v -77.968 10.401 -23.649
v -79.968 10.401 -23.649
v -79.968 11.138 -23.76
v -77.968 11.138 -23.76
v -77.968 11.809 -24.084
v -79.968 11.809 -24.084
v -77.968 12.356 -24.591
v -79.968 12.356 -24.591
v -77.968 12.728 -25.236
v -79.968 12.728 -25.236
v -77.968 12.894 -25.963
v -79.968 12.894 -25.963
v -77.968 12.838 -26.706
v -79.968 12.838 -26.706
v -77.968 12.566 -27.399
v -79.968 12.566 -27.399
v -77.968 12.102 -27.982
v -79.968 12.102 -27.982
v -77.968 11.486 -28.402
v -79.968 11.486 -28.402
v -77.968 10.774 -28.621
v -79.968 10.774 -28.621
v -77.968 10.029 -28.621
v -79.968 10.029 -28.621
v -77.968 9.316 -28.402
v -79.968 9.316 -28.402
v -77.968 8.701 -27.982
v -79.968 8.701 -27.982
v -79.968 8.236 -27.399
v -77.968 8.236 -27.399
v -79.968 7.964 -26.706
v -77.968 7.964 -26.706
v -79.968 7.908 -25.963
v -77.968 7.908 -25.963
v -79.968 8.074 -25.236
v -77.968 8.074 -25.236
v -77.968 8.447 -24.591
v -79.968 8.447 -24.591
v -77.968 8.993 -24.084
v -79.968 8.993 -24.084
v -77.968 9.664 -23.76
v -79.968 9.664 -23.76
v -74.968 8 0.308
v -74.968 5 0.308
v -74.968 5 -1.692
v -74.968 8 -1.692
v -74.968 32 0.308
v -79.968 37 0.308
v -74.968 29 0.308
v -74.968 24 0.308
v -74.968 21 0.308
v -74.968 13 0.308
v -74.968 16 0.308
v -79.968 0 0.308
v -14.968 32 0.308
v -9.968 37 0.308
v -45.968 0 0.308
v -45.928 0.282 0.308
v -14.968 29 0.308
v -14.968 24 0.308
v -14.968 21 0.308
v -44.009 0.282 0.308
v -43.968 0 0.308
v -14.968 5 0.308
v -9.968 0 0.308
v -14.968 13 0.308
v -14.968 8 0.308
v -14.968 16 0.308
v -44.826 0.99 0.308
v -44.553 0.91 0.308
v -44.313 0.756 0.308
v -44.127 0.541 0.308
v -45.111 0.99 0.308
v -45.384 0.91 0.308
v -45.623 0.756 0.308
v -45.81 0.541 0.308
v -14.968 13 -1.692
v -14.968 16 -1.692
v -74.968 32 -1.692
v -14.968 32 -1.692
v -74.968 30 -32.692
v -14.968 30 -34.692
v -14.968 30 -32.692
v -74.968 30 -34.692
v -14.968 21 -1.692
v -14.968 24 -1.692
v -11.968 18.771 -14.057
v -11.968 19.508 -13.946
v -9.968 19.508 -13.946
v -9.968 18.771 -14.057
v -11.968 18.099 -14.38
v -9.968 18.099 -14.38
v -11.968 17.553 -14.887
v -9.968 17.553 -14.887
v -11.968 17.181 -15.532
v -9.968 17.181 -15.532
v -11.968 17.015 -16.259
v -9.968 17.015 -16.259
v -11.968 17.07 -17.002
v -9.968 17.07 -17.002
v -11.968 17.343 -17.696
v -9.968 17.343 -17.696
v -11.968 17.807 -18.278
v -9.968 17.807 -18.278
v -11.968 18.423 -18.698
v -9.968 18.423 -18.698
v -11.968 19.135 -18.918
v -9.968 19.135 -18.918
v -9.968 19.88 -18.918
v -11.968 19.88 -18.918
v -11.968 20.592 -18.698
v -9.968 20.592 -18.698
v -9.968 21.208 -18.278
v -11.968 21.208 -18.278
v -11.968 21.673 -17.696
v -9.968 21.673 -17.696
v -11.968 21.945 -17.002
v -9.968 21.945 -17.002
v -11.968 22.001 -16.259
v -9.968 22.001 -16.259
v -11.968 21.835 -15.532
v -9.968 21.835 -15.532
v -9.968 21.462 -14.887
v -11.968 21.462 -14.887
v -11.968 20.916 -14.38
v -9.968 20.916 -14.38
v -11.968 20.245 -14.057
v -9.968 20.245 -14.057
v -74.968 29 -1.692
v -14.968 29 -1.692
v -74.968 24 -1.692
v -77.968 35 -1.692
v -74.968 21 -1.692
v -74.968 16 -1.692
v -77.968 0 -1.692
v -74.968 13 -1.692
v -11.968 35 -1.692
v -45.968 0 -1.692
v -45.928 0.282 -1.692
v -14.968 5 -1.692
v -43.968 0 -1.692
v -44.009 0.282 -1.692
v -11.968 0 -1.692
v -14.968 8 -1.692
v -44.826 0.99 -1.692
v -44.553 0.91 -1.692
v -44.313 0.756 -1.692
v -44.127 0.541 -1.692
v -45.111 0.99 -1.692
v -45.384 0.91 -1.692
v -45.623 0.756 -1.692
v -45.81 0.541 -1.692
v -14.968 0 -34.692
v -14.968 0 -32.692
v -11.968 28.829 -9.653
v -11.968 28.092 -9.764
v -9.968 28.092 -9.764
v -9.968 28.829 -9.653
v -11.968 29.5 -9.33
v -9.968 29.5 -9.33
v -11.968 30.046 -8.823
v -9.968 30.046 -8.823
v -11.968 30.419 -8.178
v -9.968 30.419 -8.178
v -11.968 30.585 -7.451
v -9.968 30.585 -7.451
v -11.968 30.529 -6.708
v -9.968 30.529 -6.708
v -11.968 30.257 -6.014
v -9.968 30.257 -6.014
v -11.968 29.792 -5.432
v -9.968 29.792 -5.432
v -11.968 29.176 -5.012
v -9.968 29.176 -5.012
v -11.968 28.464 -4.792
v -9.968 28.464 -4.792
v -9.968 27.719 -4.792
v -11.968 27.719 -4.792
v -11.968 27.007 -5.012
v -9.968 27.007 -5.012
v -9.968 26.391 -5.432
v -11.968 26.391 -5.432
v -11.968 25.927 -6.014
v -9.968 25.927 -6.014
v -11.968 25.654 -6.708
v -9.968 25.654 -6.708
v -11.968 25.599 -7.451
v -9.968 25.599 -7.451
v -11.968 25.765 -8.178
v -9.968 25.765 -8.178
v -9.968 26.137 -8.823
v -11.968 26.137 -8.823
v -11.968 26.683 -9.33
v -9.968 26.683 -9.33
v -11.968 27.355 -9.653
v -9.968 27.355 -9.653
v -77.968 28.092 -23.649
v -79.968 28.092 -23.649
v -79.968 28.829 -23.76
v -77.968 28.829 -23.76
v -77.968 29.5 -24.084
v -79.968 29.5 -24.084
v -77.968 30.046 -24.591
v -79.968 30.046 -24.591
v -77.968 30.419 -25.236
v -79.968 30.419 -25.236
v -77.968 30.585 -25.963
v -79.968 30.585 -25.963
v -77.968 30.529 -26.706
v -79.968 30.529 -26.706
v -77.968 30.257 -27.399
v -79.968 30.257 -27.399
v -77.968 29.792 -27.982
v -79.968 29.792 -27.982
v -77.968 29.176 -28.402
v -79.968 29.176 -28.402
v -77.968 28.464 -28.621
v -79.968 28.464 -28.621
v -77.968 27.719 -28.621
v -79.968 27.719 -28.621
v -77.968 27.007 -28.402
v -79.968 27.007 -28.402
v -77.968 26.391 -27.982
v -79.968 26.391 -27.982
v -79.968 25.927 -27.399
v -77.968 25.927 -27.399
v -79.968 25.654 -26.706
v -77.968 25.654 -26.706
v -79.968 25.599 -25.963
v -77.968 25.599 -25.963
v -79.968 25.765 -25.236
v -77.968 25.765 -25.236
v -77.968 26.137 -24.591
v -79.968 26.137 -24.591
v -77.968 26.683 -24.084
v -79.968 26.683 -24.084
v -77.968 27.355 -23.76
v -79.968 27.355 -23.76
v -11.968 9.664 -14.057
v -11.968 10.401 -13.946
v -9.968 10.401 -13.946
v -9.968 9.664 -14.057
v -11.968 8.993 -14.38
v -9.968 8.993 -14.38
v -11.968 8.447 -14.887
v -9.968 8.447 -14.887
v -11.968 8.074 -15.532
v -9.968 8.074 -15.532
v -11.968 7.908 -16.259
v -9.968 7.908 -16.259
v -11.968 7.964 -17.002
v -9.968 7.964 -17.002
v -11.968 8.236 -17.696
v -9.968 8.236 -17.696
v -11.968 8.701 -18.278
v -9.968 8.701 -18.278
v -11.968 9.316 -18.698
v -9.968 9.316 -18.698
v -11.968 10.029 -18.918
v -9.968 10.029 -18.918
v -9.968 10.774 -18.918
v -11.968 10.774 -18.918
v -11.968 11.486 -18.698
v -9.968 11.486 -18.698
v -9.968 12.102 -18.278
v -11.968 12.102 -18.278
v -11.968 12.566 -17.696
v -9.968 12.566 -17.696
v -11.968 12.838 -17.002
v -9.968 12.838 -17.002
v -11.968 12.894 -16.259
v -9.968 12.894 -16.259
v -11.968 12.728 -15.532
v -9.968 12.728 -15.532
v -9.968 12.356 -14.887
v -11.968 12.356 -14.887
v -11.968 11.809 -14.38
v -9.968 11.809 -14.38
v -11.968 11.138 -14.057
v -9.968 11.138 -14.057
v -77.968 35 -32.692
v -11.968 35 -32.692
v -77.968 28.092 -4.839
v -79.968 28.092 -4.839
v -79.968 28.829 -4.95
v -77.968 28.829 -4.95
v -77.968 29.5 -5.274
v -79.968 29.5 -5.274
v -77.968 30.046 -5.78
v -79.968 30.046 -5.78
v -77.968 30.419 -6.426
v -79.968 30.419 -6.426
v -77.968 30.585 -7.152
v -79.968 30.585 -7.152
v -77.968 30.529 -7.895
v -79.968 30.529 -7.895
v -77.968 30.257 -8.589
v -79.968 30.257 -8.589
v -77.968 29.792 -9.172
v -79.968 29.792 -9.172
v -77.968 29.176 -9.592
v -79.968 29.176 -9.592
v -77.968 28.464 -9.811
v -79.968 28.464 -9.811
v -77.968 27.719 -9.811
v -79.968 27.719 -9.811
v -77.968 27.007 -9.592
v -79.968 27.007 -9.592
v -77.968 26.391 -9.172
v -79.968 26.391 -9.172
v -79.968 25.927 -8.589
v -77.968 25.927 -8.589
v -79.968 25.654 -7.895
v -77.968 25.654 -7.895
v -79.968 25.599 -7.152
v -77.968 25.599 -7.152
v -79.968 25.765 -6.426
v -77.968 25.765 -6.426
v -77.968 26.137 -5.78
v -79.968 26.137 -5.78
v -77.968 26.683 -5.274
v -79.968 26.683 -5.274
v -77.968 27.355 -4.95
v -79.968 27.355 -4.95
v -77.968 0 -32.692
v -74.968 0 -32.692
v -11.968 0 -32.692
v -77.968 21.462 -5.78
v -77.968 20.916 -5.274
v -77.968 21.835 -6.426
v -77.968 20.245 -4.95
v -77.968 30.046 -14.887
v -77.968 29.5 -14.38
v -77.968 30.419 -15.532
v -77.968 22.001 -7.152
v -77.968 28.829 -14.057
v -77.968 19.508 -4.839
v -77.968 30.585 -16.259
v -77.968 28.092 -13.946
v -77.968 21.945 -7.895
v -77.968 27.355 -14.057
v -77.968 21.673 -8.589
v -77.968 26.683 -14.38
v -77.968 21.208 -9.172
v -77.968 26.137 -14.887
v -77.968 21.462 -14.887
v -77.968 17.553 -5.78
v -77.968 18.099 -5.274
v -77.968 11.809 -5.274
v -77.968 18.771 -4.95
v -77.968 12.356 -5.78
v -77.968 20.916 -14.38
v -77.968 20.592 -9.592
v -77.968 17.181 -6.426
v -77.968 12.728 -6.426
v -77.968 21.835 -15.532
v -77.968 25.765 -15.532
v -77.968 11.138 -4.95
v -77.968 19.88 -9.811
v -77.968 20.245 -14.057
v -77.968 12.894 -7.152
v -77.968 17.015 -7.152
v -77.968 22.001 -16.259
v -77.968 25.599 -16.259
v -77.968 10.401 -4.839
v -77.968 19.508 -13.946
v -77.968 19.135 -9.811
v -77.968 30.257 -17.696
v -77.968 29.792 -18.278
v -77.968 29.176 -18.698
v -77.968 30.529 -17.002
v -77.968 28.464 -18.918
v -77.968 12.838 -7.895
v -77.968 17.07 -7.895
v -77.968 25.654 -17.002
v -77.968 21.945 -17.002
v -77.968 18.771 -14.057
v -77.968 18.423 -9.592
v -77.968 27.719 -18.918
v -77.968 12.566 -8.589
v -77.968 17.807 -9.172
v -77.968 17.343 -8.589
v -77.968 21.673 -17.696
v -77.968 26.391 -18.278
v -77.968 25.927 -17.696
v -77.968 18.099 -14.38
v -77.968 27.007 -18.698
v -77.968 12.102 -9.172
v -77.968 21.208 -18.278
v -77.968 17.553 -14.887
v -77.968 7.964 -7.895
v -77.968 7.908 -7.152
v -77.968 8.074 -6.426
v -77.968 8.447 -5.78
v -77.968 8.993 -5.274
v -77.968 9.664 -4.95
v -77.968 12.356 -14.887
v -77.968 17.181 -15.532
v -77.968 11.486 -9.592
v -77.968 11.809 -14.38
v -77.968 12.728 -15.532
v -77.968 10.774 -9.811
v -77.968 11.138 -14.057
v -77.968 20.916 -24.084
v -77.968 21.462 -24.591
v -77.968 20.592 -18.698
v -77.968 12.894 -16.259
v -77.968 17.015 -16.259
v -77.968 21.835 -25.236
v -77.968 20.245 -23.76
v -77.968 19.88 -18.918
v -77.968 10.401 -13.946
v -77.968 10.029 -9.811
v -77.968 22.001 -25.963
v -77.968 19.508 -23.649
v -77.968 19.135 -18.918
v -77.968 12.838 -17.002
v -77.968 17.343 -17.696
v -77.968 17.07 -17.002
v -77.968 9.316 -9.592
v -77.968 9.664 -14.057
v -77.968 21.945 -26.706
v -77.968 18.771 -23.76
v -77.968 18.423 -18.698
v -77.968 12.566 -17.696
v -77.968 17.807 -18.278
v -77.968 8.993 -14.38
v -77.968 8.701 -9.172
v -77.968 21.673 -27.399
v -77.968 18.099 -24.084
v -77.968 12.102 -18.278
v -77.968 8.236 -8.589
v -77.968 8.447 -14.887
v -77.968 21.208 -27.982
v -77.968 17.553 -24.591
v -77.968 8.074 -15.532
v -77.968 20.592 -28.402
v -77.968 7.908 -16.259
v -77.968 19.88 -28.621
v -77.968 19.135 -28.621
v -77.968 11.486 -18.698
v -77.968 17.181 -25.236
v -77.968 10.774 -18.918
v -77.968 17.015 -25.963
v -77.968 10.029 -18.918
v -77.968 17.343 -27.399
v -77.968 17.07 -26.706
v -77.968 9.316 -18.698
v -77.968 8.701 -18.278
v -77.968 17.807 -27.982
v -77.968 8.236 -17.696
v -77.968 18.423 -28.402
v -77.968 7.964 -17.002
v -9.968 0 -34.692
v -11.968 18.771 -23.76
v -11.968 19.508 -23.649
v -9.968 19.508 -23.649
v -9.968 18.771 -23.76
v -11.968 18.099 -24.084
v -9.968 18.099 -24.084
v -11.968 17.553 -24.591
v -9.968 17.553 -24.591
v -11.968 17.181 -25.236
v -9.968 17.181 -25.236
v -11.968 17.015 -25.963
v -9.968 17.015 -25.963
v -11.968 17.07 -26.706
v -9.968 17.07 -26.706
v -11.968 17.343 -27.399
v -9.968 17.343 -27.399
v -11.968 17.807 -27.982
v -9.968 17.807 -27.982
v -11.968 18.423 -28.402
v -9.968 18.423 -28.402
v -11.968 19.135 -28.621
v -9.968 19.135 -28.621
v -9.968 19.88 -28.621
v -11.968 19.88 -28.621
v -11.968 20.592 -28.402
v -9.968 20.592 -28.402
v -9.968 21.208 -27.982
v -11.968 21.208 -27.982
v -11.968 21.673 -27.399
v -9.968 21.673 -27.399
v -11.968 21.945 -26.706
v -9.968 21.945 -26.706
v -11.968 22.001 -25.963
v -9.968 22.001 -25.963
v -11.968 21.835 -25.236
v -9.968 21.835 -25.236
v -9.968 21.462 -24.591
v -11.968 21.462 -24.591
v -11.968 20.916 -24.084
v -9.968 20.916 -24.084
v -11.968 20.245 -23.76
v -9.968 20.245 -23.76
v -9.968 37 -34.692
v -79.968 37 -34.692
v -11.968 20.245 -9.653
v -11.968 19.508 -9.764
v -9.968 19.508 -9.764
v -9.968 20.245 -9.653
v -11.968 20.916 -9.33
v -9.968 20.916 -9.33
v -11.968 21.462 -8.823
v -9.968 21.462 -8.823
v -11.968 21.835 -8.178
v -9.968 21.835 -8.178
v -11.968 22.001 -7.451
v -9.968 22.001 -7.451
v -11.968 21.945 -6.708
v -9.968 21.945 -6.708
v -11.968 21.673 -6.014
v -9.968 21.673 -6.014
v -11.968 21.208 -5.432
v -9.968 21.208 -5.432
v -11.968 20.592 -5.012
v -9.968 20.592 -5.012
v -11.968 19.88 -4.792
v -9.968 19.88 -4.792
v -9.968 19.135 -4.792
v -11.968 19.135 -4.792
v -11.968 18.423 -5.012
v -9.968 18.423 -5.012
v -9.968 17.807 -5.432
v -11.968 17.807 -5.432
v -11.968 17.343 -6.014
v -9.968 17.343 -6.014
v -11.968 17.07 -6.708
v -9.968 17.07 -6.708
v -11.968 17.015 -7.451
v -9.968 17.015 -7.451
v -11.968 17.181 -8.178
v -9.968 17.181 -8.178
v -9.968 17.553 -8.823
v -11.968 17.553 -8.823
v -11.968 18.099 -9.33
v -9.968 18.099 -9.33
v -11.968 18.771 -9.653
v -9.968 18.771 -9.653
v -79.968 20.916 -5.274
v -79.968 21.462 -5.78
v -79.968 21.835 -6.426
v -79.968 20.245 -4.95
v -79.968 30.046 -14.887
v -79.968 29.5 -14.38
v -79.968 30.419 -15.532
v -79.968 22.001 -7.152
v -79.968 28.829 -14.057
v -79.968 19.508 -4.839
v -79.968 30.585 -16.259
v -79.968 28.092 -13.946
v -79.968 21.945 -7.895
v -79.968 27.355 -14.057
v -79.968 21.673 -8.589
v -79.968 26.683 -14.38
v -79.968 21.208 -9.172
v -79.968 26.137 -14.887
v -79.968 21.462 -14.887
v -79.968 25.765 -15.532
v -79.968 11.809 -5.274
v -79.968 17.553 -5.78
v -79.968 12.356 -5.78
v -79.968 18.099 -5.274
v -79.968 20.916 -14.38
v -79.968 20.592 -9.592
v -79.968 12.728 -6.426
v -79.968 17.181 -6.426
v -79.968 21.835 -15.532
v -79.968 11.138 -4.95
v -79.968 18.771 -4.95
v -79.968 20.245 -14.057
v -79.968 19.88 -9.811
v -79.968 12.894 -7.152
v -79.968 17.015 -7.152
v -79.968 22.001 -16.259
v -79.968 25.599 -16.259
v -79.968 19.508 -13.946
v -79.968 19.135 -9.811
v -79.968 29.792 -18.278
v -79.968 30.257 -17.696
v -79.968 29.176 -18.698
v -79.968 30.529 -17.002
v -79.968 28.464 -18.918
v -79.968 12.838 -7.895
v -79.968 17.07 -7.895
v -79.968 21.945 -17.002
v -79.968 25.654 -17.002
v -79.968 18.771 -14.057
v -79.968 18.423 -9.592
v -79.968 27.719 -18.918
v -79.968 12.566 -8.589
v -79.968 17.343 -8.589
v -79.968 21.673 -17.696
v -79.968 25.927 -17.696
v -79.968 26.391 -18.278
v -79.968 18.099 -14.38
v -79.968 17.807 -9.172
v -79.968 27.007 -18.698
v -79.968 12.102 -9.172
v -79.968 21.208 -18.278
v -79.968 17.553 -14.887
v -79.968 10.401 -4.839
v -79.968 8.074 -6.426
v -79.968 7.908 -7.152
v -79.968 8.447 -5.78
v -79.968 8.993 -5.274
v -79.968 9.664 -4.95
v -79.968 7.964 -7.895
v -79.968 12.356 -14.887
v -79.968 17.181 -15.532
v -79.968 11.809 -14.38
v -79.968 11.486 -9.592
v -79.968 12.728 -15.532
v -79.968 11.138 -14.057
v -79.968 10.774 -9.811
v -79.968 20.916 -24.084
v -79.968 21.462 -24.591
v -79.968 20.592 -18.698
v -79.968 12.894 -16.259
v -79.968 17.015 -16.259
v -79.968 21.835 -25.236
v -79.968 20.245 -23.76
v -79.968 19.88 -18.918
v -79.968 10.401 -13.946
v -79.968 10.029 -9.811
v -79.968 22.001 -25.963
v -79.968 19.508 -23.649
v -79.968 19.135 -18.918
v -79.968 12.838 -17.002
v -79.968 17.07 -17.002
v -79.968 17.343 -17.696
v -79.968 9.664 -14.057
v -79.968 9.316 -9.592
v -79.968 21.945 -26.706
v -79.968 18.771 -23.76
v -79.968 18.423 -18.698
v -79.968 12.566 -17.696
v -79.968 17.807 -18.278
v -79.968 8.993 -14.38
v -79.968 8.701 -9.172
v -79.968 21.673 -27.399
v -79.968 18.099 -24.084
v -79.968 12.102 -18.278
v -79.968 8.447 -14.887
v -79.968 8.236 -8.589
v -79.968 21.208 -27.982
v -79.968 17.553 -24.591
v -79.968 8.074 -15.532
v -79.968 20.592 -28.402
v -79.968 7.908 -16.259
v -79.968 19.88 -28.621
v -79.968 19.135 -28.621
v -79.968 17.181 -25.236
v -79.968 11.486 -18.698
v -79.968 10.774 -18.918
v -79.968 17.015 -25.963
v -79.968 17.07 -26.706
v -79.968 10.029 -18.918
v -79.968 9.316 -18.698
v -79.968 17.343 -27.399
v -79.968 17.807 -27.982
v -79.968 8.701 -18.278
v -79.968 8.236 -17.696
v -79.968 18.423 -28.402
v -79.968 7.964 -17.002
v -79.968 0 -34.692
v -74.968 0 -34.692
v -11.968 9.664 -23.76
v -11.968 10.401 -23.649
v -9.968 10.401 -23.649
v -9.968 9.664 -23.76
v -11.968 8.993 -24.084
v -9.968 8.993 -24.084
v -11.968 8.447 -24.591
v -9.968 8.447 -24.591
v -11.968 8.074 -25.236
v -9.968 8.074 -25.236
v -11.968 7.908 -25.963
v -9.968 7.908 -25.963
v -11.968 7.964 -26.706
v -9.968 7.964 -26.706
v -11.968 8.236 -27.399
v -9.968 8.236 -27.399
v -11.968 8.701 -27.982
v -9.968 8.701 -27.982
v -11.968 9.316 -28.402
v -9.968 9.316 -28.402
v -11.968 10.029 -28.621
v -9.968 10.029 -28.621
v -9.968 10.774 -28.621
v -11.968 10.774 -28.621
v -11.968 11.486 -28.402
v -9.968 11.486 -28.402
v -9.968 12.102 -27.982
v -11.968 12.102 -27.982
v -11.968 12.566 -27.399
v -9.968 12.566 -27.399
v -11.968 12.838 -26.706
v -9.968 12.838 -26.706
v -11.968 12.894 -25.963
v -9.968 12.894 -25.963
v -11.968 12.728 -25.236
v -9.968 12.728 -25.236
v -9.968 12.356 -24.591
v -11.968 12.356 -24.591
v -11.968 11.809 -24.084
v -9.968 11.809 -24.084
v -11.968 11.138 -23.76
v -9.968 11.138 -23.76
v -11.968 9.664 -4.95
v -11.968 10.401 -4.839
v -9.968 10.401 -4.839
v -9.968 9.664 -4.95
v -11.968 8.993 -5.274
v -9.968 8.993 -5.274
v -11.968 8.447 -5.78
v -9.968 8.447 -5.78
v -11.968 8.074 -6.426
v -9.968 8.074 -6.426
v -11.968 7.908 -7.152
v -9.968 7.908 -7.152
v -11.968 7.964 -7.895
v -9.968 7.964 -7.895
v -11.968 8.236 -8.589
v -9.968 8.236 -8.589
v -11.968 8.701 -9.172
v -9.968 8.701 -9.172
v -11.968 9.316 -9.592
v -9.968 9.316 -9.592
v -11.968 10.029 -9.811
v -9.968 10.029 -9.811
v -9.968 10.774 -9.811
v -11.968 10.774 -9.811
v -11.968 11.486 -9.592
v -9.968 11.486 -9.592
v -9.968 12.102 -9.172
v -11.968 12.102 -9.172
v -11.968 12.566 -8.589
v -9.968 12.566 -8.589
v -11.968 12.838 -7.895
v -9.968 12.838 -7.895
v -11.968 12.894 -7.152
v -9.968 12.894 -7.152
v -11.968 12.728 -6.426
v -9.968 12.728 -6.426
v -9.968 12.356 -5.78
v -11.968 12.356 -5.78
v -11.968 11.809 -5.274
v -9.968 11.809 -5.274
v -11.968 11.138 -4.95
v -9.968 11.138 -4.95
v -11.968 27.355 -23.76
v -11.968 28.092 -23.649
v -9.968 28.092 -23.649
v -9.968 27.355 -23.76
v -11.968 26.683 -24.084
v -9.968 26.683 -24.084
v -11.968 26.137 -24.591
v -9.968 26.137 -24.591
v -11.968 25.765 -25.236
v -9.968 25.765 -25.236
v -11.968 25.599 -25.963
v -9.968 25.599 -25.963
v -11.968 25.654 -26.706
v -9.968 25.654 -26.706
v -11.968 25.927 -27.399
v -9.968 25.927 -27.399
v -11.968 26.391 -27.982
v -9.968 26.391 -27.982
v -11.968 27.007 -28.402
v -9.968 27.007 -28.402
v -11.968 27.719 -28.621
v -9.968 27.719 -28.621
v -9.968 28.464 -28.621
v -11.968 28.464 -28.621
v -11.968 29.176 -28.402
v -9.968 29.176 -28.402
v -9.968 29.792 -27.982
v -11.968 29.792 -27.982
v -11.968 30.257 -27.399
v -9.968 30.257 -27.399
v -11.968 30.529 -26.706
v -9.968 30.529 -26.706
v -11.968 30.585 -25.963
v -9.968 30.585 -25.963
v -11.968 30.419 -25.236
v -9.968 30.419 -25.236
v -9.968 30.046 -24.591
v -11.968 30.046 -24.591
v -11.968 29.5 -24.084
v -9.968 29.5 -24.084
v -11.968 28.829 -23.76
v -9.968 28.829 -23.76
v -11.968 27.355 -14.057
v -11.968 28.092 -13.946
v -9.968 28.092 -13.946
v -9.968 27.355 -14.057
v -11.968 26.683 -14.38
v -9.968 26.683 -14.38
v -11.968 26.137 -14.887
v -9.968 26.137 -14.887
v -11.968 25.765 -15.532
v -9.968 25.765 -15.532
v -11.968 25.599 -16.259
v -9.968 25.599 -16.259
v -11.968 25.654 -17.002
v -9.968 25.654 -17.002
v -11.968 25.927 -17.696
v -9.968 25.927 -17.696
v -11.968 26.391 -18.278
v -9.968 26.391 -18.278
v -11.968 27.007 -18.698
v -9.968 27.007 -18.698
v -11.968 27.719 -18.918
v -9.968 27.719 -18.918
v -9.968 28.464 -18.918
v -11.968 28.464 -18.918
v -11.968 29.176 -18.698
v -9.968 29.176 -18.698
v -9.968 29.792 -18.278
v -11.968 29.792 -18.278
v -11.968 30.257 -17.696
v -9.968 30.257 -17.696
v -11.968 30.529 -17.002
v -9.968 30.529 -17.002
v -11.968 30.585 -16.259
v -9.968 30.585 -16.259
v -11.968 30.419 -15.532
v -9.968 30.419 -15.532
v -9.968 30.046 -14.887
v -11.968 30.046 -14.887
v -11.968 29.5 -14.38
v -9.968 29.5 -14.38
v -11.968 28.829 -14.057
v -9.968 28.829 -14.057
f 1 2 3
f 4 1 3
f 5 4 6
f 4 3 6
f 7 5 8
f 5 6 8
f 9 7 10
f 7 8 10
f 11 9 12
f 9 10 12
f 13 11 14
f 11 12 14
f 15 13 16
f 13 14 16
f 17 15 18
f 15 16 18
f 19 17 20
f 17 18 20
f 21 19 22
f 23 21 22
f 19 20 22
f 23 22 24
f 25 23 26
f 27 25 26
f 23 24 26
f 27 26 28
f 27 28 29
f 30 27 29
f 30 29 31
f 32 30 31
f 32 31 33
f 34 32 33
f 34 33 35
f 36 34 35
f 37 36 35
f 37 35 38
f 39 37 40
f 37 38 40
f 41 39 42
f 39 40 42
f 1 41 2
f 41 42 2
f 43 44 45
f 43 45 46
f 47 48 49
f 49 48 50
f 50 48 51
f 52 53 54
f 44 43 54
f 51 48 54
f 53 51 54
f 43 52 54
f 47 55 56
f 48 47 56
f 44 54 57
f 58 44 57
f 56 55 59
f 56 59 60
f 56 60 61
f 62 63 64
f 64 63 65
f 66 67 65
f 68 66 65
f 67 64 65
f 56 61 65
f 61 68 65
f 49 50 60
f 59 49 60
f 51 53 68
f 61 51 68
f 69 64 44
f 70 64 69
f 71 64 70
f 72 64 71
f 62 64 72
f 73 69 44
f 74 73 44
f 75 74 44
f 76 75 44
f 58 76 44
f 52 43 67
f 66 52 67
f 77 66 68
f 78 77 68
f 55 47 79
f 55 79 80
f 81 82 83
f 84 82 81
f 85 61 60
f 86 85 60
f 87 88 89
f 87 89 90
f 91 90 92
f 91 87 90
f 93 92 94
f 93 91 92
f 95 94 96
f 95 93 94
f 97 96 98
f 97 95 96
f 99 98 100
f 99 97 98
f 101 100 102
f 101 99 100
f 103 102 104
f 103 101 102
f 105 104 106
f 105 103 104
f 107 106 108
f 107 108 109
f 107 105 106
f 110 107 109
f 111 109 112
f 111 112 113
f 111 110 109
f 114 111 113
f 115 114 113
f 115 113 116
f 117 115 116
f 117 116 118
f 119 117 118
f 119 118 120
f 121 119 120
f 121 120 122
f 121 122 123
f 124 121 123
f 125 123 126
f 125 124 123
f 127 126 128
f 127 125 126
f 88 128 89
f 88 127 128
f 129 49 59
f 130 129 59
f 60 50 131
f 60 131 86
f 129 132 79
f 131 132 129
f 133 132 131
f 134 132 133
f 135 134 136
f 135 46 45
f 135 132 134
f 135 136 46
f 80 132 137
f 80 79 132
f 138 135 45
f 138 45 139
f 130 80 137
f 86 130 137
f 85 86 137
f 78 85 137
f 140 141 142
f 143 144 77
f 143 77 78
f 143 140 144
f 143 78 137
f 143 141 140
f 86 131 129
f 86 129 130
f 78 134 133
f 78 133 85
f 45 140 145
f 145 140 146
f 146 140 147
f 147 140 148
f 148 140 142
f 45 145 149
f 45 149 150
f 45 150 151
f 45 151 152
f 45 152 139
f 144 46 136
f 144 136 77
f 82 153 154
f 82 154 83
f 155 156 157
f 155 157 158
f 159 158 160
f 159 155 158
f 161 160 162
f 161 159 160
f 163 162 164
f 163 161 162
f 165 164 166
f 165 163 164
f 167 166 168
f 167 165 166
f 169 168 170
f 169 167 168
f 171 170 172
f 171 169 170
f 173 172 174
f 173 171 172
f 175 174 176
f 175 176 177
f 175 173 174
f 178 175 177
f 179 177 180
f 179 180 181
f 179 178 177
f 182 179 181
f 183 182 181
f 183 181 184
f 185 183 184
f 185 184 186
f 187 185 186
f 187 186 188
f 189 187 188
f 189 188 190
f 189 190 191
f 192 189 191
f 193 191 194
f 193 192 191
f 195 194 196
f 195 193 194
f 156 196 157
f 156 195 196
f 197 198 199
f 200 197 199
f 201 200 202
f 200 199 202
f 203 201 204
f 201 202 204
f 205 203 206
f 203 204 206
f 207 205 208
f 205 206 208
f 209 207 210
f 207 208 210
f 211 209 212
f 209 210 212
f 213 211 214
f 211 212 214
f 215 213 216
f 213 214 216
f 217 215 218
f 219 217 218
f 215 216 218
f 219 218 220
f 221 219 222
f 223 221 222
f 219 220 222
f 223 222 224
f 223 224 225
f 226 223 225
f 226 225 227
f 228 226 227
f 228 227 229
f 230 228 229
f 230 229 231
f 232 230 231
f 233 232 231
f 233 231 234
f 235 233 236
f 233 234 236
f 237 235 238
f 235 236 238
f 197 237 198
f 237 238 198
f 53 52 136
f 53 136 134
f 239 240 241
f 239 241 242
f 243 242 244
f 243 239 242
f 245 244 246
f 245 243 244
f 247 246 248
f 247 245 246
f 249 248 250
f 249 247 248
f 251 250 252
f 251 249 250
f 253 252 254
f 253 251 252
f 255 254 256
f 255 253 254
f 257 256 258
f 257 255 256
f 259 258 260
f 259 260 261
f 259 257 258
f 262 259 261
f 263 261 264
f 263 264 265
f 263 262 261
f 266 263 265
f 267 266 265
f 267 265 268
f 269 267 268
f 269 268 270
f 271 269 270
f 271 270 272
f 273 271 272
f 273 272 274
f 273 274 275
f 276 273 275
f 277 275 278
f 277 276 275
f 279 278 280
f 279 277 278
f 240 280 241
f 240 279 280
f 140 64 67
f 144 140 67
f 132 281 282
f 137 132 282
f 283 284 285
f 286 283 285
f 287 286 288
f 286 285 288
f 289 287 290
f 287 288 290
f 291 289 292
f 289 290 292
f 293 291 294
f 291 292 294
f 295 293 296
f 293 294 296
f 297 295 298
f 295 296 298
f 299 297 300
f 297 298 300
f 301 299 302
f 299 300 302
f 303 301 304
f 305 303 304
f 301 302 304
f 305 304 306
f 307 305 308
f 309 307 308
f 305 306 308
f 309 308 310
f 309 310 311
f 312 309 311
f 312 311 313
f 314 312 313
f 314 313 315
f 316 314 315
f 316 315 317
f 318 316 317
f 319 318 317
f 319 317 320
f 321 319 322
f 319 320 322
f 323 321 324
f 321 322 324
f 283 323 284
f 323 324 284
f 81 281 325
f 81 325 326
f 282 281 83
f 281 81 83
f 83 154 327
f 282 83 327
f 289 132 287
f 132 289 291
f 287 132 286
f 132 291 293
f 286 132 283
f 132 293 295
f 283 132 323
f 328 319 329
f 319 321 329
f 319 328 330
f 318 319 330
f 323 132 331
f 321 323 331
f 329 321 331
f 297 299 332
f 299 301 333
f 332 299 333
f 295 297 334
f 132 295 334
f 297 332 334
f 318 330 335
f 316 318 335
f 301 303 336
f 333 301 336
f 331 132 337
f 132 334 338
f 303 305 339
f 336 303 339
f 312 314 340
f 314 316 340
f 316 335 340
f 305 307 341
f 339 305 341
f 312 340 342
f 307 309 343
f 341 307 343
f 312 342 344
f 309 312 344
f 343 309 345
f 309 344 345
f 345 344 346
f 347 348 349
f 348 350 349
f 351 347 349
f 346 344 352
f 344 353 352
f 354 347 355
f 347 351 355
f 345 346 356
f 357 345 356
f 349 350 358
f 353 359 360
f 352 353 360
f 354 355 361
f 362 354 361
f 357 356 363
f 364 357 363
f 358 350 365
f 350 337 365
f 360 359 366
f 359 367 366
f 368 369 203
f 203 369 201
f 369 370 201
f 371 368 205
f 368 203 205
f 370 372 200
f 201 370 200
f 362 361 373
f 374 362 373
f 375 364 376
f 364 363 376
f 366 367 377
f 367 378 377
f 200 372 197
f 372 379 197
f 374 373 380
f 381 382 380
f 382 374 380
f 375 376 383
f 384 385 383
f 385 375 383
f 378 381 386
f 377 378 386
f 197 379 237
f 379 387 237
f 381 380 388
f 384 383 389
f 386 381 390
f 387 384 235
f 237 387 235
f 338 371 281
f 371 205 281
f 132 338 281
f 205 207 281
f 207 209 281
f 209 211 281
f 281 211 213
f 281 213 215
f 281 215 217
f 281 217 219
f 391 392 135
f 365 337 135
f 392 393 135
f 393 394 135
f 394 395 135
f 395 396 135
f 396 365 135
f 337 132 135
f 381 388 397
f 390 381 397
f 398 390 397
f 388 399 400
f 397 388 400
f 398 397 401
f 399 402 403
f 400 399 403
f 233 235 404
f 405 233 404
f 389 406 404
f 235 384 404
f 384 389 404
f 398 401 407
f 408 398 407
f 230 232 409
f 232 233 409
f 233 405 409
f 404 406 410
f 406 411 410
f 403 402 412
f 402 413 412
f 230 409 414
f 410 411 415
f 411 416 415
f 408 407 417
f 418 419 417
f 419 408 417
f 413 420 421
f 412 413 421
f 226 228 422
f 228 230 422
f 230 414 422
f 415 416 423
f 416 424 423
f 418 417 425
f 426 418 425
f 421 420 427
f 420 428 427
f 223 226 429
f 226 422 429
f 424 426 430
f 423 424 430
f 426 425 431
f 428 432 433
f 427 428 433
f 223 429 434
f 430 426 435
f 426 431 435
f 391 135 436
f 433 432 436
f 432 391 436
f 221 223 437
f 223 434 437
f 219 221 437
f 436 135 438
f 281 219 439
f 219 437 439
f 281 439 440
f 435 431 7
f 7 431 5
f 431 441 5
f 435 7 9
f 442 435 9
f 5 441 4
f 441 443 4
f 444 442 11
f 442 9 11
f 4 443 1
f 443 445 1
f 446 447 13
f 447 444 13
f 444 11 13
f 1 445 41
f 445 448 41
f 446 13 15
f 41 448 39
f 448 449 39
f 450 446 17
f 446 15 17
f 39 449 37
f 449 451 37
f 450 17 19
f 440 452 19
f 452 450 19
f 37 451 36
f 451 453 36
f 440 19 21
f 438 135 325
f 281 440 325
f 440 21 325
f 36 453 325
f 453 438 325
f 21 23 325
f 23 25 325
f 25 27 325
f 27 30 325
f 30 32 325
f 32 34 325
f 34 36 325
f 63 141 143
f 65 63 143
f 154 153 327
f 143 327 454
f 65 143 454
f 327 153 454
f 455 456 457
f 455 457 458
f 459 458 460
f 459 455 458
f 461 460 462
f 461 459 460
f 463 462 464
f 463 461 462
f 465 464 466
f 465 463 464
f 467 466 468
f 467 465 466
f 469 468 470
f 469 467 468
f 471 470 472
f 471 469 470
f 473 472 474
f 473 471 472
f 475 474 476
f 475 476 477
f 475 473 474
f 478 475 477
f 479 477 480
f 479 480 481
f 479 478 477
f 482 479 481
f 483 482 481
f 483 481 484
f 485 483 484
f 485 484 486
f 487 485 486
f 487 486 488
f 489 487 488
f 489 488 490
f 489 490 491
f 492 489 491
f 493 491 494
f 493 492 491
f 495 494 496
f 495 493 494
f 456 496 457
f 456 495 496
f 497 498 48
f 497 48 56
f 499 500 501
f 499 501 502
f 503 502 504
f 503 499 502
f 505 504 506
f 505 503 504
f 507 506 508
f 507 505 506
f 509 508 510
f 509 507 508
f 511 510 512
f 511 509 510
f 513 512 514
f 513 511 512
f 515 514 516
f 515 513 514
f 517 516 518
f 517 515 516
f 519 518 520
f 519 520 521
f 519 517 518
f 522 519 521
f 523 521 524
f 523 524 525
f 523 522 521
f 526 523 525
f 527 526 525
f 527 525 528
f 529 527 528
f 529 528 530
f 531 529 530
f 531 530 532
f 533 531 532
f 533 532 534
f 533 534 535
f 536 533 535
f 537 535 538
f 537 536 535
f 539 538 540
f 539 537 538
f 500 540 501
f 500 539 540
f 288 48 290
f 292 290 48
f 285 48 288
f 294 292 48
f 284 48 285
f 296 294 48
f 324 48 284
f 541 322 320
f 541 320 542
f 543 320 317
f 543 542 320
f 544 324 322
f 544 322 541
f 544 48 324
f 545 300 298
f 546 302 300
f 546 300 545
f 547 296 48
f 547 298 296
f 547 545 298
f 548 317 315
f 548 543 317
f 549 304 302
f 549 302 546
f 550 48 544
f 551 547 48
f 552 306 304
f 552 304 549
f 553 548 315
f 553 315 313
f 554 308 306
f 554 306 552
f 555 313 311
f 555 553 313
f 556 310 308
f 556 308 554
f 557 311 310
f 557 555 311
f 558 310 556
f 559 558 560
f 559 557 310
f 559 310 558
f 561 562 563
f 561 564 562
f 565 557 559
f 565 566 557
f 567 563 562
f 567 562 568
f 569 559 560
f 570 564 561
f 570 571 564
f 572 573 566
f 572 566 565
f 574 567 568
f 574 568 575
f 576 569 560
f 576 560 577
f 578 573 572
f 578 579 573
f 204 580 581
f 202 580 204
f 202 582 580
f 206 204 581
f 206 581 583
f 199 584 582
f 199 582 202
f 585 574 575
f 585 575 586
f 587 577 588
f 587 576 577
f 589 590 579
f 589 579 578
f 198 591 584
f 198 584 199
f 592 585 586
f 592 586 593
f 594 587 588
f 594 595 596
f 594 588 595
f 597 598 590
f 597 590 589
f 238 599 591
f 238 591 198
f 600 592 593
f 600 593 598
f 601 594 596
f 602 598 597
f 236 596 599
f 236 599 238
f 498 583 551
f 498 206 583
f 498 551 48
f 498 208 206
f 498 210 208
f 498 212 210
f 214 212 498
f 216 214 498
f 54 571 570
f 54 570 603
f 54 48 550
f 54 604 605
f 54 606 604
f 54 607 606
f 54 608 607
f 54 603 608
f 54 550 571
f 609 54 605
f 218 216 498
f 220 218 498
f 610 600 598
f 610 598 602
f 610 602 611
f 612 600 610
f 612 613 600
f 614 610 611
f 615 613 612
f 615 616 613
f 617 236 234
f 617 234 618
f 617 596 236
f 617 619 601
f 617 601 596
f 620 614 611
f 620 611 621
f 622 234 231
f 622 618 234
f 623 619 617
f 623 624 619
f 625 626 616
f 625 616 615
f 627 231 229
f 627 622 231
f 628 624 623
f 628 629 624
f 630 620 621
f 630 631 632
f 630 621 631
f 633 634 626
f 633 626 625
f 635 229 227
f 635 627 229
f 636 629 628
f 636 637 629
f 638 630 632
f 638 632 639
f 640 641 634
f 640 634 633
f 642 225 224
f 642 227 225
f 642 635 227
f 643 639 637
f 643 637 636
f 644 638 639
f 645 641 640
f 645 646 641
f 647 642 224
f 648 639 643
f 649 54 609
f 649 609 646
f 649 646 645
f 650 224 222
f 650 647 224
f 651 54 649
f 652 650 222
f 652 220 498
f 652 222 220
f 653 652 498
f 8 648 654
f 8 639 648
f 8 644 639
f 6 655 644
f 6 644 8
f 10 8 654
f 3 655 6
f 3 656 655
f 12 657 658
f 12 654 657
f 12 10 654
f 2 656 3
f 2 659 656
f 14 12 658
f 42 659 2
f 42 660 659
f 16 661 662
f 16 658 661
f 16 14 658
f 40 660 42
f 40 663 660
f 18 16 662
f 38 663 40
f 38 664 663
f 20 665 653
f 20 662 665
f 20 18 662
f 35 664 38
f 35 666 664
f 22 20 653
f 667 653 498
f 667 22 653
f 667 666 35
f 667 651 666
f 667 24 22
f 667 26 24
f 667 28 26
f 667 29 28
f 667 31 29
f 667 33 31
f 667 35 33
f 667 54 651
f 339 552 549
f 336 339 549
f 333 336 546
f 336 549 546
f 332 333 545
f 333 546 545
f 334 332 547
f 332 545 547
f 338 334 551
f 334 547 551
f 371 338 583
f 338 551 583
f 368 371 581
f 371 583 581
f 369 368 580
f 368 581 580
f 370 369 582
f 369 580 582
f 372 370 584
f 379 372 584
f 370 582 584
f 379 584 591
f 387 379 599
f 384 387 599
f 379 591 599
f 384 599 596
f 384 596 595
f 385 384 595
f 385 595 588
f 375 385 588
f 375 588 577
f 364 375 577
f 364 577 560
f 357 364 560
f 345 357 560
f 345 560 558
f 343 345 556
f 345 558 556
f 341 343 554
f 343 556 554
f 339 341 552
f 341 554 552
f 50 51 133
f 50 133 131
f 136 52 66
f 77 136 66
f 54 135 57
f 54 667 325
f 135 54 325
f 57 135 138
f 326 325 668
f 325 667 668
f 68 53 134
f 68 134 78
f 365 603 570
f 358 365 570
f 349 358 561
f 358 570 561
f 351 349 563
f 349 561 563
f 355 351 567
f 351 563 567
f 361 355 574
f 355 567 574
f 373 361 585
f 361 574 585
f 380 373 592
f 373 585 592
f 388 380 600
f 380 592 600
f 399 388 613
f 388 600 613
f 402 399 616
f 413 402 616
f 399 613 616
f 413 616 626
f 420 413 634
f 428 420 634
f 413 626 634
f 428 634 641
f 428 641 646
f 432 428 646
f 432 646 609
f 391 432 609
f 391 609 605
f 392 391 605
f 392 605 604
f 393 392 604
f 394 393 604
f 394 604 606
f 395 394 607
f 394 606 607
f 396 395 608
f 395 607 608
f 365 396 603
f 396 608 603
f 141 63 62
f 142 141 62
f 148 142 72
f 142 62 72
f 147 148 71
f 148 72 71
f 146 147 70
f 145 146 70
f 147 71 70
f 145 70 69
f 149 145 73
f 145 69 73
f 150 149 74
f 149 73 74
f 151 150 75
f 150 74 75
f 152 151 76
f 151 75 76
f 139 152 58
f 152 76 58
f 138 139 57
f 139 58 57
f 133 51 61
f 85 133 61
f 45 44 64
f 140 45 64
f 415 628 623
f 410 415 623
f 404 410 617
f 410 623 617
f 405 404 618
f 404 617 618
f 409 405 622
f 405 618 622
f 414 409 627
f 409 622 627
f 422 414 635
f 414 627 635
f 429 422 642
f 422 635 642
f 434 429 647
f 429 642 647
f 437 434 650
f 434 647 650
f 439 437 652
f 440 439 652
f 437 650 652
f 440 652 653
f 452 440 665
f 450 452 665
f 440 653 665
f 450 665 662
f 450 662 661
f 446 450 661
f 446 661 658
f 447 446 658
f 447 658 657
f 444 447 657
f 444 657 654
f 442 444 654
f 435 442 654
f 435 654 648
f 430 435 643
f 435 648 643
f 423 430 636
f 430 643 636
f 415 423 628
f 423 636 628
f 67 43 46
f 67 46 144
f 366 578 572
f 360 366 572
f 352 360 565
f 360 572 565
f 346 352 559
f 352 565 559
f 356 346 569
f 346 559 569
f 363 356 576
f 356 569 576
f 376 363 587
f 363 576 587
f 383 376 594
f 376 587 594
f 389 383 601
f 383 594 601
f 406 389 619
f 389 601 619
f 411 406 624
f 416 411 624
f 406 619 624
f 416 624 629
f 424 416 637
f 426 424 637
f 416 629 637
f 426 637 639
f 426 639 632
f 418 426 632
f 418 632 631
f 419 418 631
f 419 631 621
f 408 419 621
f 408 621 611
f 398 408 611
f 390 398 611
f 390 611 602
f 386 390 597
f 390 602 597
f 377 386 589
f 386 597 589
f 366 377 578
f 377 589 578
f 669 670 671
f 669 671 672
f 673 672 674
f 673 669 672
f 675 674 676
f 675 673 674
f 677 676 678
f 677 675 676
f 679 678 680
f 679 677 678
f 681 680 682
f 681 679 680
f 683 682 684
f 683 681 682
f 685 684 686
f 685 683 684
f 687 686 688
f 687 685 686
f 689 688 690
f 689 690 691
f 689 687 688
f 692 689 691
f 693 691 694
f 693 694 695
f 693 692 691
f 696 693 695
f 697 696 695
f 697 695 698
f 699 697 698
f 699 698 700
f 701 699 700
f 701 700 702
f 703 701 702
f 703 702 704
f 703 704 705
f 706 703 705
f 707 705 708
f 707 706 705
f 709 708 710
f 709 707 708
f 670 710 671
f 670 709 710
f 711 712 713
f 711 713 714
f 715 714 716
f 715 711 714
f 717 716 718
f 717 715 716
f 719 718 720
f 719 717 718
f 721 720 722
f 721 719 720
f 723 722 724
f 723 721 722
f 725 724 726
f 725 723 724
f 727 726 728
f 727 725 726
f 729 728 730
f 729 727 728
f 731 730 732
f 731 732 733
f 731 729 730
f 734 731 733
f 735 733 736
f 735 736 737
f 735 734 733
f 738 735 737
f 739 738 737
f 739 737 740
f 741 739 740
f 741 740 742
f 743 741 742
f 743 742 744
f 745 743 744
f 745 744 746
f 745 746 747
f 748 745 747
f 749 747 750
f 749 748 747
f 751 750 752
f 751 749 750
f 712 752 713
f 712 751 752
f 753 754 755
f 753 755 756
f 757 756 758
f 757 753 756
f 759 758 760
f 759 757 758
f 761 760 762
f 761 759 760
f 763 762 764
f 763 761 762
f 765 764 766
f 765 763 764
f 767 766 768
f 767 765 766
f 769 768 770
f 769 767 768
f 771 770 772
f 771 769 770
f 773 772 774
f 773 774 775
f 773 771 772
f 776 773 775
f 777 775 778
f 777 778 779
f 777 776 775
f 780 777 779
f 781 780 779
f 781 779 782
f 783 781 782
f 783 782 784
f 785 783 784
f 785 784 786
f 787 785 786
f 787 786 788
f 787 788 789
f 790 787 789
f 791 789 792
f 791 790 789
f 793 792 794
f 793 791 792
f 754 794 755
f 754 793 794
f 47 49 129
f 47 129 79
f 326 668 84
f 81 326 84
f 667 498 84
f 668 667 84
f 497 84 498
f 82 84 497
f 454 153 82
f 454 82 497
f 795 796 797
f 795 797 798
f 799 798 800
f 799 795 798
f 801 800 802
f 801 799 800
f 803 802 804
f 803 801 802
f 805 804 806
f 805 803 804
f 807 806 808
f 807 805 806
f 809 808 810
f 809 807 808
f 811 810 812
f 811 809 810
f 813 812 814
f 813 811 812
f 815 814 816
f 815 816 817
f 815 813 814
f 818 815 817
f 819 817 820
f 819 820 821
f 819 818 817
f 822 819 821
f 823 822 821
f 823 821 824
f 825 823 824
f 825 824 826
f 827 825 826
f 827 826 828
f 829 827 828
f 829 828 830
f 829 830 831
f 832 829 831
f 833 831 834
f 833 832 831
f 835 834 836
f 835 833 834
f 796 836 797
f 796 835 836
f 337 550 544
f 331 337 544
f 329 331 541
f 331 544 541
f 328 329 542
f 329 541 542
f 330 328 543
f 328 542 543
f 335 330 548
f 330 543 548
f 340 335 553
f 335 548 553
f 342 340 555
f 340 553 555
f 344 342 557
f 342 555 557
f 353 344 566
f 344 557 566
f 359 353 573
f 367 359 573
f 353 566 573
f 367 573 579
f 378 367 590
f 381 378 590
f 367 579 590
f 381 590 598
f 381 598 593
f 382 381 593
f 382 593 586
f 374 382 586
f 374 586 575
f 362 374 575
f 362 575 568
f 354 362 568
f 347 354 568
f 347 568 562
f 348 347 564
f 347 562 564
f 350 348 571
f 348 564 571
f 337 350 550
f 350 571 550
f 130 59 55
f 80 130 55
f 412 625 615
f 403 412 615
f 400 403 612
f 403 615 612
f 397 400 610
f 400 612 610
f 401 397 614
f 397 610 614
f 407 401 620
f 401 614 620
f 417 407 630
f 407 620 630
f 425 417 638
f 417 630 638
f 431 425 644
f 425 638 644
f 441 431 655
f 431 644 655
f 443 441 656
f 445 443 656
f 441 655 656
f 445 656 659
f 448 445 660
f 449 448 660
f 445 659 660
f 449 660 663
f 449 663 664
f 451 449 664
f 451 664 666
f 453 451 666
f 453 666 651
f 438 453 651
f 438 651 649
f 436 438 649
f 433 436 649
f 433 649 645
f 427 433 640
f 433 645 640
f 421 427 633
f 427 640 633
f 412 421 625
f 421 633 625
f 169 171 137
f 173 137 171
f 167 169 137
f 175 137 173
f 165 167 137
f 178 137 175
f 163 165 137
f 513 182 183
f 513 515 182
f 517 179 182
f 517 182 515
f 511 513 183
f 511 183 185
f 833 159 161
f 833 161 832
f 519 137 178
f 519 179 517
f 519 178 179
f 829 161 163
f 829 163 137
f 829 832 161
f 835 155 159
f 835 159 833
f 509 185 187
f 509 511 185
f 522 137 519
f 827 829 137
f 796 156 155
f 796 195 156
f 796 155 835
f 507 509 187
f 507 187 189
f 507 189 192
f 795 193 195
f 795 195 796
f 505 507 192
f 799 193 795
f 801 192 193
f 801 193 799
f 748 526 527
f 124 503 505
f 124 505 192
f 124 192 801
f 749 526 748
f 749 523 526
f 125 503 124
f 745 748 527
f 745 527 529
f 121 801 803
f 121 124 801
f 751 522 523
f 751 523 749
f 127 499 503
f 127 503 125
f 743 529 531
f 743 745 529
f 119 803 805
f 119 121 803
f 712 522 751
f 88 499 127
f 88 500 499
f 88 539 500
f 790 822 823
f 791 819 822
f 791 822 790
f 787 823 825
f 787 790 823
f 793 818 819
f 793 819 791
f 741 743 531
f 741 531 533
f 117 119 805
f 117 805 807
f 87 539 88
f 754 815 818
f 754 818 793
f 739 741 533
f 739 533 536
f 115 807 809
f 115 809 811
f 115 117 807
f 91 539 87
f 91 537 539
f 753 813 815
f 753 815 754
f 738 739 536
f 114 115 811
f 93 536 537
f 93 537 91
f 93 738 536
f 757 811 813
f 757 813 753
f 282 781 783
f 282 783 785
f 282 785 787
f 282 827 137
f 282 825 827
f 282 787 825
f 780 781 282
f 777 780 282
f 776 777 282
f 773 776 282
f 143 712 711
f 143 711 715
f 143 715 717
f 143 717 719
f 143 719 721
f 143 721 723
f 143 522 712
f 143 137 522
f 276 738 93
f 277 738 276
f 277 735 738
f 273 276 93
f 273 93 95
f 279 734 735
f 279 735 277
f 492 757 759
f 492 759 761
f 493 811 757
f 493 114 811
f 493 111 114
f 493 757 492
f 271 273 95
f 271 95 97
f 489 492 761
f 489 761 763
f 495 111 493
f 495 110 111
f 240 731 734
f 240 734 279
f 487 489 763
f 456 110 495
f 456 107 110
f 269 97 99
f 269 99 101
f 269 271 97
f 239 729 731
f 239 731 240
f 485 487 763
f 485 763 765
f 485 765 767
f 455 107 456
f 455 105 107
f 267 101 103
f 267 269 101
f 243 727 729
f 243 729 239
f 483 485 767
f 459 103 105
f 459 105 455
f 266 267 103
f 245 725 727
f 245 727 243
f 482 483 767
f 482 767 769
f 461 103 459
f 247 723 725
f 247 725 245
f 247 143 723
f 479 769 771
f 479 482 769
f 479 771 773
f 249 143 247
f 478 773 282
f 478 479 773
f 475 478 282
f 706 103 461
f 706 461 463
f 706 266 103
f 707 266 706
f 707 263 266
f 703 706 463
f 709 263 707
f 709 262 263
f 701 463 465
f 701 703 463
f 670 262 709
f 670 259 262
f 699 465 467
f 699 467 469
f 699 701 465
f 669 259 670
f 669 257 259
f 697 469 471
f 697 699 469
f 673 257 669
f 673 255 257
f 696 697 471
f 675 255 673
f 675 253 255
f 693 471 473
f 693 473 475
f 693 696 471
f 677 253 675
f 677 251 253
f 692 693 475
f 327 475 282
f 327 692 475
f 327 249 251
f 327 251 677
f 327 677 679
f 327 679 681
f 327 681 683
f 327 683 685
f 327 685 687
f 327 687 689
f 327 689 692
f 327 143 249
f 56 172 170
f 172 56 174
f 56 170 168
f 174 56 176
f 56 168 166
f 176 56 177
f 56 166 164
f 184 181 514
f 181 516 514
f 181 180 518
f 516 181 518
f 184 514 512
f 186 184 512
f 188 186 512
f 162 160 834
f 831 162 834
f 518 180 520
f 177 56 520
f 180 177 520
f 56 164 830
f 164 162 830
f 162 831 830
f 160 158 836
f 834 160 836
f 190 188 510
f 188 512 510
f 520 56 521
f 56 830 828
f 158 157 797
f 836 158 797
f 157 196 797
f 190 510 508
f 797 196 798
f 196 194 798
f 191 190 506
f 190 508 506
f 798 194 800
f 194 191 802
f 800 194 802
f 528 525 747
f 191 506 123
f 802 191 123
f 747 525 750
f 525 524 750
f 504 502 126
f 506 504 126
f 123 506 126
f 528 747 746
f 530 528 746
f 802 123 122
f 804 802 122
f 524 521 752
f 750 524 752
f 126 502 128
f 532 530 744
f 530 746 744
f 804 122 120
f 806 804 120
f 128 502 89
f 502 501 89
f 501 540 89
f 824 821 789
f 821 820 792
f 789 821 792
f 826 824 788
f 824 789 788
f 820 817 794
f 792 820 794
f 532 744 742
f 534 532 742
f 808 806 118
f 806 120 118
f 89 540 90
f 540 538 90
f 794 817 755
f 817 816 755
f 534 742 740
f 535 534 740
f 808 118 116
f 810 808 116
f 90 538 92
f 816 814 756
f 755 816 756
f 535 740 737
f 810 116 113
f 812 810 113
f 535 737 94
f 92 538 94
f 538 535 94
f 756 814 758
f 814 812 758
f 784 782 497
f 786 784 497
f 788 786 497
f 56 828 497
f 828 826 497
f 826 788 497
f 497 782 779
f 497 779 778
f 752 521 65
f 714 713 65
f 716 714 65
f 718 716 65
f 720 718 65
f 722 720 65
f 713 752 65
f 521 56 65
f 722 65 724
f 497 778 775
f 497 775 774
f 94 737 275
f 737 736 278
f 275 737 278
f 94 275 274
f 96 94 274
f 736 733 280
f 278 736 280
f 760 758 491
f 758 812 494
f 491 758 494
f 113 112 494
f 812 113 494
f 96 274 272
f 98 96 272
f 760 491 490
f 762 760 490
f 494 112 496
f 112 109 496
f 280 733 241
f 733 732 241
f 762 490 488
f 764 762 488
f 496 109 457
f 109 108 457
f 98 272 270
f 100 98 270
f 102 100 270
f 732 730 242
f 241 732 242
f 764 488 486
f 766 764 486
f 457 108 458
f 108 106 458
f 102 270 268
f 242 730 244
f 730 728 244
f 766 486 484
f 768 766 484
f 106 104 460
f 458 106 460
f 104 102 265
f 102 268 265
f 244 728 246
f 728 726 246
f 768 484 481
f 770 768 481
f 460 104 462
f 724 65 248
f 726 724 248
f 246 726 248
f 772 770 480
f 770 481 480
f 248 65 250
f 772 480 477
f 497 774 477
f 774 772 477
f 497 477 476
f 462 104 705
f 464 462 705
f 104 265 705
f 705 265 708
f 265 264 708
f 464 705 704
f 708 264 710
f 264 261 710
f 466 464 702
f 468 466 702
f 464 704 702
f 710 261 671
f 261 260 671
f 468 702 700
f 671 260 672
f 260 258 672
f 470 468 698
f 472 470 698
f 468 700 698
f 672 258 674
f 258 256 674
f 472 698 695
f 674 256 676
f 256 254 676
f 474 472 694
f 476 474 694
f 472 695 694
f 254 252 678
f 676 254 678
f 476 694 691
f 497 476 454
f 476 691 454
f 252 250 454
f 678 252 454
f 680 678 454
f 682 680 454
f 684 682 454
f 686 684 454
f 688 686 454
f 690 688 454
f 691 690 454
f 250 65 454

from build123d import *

# Parameters (mm, degrees)
SKETCH1_W           = 70
SKETCH1_H           = 35
BOSS_EXTRUDE1_DEPTH = 37
SHELL1_T            = -2
CUT_EXTRUDE1_DEPTH  = 2
SKETCH3_W           = 60
SKETCH3_H           = 30
CUT_EXTRUDE3_DEPTH  = 2
SKETCH4_W           = 60
SKETCH4_H           = 3
CUT_EXTRUDE4_DEPTH  = 2
SKETCH5_R           = 2.5
CUT_EXTRUDE5_DEPTH  = 2
CUT_EXTRUDE6_START  = -2
SKETCH6_R           = 2.5
CUT_EXTRUDE6_DEPTH  = 2


with BuildPart() as part:
    # Sketch1 → Boss-Extrude1 (new body)
    with BuildSketch(Plane(origin=(0, 0, 0), x_dir=(1, 0, 0), z_dir=(0, 1, 0))):
        with Locations((-44.968255968, 17.192111045)):
            Rectangle(SKETCH1_W, SKETCH1_H)
    extrude(amount=BOSS_EXTRUDE1_DEPTH)

    # Shell1
    shell1_openings = [part.faces().sort_by_distance(p)[0] for p in [
        (-44.968255968, 0, -17.192111045),
    ]]
    offset(amount=SHELL1_T, openings=shell1_openings, kind=Kind.INTERSECTION)

    # Sketch2 → Cut-Extrude1 (cut)
    with BuildSketch(Plane.XY.offset(0.307888955)):
        with BuildLine():
            Line((-45.968255968, 0), (-44.968255968, 0))
            Line((-44.968255968, 0), (-43.968255968, 0))
            ThreePointArc((-43.968255968, 0), (-44.968255968, 1), (-45.968255968, 0))
        make_face()
    extrude(amount=-CUT_EXTRUDE1_DEPTH, mode=Mode.SUBTRACT)

    # Sketch3 → Cut-Extrude3 (cut)
    with BuildSketch(Plane(origin=(0, 0, -34.692111045), x_dir=(-1, 0, 0), z_dir=(0, 0, -1))):
        with Locations((44.968255968, 15)):
            Rectangle(SKETCH3_W, SKETCH3_H)
    extrude(amount=-CUT_EXTRUDE3_DEPTH, mode=Mode.SUBTRACT)

    # Sketch4 → Cut-Extrude4 (cut)
    with BuildSketch(Plane.XY.offset(0.307888955)):
        with Locations((-44.968255968, 14.5)):
            Rectangle(SKETCH4_W, SKETCH4_H)
        with Locations((-44.968255968, 22.5)):
            Rectangle(SKETCH4_W, SKETCH4_H)
        with Locations((-44.968255968, 30.5)):
            Rectangle(SKETCH4_W, SKETCH4_H)
        with Locations((-44.968255968, 6.5)):
            Rectangle(SKETCH4_W, SKETCH4_H)
    extrude(amount=-CUT_EXTRUDE4_DEPTH, mode=Mode.SUBTRACT)

    # Sketch5 → Cut-Extrude5 (cut)
    with BuildSketch(Plane.ZY.offset(79.968255968)):
        with Locations((-26.149373003, 28.09173468)):
            Circle(SKETCH5_R)
        with Locations((-26.149373003, 19.50769197)):
            Circle(SKETCH5_R)
        with Locations((-26.149373003, 10.401142313)):
            Circle(SKETCH5_R)
        with Locations((-16.445672549, 10.401142313)):
            Circle(SKETCH5_R)
        with Locations((-16.445672549, 19.50769197)):
            Circle(SKETCH5_R)
        with Locations((-16.445672549, 28.09173468)):
            Circle(SKETCH5_R)
        with Locations((-7.339122891, 28.09173468)):
            Circle(SKETCH5_R)
        with Locations((-7.339122891, 19.50769197)):
            Circle(SKETCH5_R)
        with Locations((-7.339122891, 10.401142313)):
            Circle(SKETCH5_R)
    extrude(amount=-CUT_EXTRUDE5_DEPTH, mode=Mode.SUBTRACT)

    # Sketch6 → Cut-Extrude6 (cut)
    with BuildSketch(Plane(origin=(-9.968255968, 0, 0), x_dir=(0, 0, -1), z_dir=(1, 0, 0)).offset(CUT_EXTRUDE6_START)):
        with Locations((7.264479042, 28.09173468)):
            Circle(SKETCH6_R)
        with Locations((7.264479042, 19.50769197)):
            Circle(SKETCH6_R)
        with Locations(Location((7.339122891, 10.401142313, 0), (0, 0, 180))):
            Circle(SKETCH6_R)
        with Locations(Location((16.445672549, 10.401142313, 0), (0, 0, 180))):
            Circle(SKETCH6_R)
        with Locations(Location((16.445672549, 19.50769197, 0), (0, 0, 180))):
            Circle(SKETCH6_R)
        with Locations(Location((26.149373003, 19.50769197, 0), (0, 0, 180))):
            Circle(SKETCH6_R)
        with Locations(Location((16.445672549, 28.09173468, 0), (0, 0, 180))):
            Circle(SKETCH6_R)
        with Locations(Location((26.149373003, 28.09173468, 0), (0, 0, 180))):
            Circle(SKETCH6_R)
        with Locations(Location((26.149373003, 10.401142313, 0), (0, 0, 180))):
            Circle(SKETCH6_R)
    extrude(amount=CUT_EXTRUDE6_DEPTH, mode=Mode.SUBTRACT)


solid = part.part
